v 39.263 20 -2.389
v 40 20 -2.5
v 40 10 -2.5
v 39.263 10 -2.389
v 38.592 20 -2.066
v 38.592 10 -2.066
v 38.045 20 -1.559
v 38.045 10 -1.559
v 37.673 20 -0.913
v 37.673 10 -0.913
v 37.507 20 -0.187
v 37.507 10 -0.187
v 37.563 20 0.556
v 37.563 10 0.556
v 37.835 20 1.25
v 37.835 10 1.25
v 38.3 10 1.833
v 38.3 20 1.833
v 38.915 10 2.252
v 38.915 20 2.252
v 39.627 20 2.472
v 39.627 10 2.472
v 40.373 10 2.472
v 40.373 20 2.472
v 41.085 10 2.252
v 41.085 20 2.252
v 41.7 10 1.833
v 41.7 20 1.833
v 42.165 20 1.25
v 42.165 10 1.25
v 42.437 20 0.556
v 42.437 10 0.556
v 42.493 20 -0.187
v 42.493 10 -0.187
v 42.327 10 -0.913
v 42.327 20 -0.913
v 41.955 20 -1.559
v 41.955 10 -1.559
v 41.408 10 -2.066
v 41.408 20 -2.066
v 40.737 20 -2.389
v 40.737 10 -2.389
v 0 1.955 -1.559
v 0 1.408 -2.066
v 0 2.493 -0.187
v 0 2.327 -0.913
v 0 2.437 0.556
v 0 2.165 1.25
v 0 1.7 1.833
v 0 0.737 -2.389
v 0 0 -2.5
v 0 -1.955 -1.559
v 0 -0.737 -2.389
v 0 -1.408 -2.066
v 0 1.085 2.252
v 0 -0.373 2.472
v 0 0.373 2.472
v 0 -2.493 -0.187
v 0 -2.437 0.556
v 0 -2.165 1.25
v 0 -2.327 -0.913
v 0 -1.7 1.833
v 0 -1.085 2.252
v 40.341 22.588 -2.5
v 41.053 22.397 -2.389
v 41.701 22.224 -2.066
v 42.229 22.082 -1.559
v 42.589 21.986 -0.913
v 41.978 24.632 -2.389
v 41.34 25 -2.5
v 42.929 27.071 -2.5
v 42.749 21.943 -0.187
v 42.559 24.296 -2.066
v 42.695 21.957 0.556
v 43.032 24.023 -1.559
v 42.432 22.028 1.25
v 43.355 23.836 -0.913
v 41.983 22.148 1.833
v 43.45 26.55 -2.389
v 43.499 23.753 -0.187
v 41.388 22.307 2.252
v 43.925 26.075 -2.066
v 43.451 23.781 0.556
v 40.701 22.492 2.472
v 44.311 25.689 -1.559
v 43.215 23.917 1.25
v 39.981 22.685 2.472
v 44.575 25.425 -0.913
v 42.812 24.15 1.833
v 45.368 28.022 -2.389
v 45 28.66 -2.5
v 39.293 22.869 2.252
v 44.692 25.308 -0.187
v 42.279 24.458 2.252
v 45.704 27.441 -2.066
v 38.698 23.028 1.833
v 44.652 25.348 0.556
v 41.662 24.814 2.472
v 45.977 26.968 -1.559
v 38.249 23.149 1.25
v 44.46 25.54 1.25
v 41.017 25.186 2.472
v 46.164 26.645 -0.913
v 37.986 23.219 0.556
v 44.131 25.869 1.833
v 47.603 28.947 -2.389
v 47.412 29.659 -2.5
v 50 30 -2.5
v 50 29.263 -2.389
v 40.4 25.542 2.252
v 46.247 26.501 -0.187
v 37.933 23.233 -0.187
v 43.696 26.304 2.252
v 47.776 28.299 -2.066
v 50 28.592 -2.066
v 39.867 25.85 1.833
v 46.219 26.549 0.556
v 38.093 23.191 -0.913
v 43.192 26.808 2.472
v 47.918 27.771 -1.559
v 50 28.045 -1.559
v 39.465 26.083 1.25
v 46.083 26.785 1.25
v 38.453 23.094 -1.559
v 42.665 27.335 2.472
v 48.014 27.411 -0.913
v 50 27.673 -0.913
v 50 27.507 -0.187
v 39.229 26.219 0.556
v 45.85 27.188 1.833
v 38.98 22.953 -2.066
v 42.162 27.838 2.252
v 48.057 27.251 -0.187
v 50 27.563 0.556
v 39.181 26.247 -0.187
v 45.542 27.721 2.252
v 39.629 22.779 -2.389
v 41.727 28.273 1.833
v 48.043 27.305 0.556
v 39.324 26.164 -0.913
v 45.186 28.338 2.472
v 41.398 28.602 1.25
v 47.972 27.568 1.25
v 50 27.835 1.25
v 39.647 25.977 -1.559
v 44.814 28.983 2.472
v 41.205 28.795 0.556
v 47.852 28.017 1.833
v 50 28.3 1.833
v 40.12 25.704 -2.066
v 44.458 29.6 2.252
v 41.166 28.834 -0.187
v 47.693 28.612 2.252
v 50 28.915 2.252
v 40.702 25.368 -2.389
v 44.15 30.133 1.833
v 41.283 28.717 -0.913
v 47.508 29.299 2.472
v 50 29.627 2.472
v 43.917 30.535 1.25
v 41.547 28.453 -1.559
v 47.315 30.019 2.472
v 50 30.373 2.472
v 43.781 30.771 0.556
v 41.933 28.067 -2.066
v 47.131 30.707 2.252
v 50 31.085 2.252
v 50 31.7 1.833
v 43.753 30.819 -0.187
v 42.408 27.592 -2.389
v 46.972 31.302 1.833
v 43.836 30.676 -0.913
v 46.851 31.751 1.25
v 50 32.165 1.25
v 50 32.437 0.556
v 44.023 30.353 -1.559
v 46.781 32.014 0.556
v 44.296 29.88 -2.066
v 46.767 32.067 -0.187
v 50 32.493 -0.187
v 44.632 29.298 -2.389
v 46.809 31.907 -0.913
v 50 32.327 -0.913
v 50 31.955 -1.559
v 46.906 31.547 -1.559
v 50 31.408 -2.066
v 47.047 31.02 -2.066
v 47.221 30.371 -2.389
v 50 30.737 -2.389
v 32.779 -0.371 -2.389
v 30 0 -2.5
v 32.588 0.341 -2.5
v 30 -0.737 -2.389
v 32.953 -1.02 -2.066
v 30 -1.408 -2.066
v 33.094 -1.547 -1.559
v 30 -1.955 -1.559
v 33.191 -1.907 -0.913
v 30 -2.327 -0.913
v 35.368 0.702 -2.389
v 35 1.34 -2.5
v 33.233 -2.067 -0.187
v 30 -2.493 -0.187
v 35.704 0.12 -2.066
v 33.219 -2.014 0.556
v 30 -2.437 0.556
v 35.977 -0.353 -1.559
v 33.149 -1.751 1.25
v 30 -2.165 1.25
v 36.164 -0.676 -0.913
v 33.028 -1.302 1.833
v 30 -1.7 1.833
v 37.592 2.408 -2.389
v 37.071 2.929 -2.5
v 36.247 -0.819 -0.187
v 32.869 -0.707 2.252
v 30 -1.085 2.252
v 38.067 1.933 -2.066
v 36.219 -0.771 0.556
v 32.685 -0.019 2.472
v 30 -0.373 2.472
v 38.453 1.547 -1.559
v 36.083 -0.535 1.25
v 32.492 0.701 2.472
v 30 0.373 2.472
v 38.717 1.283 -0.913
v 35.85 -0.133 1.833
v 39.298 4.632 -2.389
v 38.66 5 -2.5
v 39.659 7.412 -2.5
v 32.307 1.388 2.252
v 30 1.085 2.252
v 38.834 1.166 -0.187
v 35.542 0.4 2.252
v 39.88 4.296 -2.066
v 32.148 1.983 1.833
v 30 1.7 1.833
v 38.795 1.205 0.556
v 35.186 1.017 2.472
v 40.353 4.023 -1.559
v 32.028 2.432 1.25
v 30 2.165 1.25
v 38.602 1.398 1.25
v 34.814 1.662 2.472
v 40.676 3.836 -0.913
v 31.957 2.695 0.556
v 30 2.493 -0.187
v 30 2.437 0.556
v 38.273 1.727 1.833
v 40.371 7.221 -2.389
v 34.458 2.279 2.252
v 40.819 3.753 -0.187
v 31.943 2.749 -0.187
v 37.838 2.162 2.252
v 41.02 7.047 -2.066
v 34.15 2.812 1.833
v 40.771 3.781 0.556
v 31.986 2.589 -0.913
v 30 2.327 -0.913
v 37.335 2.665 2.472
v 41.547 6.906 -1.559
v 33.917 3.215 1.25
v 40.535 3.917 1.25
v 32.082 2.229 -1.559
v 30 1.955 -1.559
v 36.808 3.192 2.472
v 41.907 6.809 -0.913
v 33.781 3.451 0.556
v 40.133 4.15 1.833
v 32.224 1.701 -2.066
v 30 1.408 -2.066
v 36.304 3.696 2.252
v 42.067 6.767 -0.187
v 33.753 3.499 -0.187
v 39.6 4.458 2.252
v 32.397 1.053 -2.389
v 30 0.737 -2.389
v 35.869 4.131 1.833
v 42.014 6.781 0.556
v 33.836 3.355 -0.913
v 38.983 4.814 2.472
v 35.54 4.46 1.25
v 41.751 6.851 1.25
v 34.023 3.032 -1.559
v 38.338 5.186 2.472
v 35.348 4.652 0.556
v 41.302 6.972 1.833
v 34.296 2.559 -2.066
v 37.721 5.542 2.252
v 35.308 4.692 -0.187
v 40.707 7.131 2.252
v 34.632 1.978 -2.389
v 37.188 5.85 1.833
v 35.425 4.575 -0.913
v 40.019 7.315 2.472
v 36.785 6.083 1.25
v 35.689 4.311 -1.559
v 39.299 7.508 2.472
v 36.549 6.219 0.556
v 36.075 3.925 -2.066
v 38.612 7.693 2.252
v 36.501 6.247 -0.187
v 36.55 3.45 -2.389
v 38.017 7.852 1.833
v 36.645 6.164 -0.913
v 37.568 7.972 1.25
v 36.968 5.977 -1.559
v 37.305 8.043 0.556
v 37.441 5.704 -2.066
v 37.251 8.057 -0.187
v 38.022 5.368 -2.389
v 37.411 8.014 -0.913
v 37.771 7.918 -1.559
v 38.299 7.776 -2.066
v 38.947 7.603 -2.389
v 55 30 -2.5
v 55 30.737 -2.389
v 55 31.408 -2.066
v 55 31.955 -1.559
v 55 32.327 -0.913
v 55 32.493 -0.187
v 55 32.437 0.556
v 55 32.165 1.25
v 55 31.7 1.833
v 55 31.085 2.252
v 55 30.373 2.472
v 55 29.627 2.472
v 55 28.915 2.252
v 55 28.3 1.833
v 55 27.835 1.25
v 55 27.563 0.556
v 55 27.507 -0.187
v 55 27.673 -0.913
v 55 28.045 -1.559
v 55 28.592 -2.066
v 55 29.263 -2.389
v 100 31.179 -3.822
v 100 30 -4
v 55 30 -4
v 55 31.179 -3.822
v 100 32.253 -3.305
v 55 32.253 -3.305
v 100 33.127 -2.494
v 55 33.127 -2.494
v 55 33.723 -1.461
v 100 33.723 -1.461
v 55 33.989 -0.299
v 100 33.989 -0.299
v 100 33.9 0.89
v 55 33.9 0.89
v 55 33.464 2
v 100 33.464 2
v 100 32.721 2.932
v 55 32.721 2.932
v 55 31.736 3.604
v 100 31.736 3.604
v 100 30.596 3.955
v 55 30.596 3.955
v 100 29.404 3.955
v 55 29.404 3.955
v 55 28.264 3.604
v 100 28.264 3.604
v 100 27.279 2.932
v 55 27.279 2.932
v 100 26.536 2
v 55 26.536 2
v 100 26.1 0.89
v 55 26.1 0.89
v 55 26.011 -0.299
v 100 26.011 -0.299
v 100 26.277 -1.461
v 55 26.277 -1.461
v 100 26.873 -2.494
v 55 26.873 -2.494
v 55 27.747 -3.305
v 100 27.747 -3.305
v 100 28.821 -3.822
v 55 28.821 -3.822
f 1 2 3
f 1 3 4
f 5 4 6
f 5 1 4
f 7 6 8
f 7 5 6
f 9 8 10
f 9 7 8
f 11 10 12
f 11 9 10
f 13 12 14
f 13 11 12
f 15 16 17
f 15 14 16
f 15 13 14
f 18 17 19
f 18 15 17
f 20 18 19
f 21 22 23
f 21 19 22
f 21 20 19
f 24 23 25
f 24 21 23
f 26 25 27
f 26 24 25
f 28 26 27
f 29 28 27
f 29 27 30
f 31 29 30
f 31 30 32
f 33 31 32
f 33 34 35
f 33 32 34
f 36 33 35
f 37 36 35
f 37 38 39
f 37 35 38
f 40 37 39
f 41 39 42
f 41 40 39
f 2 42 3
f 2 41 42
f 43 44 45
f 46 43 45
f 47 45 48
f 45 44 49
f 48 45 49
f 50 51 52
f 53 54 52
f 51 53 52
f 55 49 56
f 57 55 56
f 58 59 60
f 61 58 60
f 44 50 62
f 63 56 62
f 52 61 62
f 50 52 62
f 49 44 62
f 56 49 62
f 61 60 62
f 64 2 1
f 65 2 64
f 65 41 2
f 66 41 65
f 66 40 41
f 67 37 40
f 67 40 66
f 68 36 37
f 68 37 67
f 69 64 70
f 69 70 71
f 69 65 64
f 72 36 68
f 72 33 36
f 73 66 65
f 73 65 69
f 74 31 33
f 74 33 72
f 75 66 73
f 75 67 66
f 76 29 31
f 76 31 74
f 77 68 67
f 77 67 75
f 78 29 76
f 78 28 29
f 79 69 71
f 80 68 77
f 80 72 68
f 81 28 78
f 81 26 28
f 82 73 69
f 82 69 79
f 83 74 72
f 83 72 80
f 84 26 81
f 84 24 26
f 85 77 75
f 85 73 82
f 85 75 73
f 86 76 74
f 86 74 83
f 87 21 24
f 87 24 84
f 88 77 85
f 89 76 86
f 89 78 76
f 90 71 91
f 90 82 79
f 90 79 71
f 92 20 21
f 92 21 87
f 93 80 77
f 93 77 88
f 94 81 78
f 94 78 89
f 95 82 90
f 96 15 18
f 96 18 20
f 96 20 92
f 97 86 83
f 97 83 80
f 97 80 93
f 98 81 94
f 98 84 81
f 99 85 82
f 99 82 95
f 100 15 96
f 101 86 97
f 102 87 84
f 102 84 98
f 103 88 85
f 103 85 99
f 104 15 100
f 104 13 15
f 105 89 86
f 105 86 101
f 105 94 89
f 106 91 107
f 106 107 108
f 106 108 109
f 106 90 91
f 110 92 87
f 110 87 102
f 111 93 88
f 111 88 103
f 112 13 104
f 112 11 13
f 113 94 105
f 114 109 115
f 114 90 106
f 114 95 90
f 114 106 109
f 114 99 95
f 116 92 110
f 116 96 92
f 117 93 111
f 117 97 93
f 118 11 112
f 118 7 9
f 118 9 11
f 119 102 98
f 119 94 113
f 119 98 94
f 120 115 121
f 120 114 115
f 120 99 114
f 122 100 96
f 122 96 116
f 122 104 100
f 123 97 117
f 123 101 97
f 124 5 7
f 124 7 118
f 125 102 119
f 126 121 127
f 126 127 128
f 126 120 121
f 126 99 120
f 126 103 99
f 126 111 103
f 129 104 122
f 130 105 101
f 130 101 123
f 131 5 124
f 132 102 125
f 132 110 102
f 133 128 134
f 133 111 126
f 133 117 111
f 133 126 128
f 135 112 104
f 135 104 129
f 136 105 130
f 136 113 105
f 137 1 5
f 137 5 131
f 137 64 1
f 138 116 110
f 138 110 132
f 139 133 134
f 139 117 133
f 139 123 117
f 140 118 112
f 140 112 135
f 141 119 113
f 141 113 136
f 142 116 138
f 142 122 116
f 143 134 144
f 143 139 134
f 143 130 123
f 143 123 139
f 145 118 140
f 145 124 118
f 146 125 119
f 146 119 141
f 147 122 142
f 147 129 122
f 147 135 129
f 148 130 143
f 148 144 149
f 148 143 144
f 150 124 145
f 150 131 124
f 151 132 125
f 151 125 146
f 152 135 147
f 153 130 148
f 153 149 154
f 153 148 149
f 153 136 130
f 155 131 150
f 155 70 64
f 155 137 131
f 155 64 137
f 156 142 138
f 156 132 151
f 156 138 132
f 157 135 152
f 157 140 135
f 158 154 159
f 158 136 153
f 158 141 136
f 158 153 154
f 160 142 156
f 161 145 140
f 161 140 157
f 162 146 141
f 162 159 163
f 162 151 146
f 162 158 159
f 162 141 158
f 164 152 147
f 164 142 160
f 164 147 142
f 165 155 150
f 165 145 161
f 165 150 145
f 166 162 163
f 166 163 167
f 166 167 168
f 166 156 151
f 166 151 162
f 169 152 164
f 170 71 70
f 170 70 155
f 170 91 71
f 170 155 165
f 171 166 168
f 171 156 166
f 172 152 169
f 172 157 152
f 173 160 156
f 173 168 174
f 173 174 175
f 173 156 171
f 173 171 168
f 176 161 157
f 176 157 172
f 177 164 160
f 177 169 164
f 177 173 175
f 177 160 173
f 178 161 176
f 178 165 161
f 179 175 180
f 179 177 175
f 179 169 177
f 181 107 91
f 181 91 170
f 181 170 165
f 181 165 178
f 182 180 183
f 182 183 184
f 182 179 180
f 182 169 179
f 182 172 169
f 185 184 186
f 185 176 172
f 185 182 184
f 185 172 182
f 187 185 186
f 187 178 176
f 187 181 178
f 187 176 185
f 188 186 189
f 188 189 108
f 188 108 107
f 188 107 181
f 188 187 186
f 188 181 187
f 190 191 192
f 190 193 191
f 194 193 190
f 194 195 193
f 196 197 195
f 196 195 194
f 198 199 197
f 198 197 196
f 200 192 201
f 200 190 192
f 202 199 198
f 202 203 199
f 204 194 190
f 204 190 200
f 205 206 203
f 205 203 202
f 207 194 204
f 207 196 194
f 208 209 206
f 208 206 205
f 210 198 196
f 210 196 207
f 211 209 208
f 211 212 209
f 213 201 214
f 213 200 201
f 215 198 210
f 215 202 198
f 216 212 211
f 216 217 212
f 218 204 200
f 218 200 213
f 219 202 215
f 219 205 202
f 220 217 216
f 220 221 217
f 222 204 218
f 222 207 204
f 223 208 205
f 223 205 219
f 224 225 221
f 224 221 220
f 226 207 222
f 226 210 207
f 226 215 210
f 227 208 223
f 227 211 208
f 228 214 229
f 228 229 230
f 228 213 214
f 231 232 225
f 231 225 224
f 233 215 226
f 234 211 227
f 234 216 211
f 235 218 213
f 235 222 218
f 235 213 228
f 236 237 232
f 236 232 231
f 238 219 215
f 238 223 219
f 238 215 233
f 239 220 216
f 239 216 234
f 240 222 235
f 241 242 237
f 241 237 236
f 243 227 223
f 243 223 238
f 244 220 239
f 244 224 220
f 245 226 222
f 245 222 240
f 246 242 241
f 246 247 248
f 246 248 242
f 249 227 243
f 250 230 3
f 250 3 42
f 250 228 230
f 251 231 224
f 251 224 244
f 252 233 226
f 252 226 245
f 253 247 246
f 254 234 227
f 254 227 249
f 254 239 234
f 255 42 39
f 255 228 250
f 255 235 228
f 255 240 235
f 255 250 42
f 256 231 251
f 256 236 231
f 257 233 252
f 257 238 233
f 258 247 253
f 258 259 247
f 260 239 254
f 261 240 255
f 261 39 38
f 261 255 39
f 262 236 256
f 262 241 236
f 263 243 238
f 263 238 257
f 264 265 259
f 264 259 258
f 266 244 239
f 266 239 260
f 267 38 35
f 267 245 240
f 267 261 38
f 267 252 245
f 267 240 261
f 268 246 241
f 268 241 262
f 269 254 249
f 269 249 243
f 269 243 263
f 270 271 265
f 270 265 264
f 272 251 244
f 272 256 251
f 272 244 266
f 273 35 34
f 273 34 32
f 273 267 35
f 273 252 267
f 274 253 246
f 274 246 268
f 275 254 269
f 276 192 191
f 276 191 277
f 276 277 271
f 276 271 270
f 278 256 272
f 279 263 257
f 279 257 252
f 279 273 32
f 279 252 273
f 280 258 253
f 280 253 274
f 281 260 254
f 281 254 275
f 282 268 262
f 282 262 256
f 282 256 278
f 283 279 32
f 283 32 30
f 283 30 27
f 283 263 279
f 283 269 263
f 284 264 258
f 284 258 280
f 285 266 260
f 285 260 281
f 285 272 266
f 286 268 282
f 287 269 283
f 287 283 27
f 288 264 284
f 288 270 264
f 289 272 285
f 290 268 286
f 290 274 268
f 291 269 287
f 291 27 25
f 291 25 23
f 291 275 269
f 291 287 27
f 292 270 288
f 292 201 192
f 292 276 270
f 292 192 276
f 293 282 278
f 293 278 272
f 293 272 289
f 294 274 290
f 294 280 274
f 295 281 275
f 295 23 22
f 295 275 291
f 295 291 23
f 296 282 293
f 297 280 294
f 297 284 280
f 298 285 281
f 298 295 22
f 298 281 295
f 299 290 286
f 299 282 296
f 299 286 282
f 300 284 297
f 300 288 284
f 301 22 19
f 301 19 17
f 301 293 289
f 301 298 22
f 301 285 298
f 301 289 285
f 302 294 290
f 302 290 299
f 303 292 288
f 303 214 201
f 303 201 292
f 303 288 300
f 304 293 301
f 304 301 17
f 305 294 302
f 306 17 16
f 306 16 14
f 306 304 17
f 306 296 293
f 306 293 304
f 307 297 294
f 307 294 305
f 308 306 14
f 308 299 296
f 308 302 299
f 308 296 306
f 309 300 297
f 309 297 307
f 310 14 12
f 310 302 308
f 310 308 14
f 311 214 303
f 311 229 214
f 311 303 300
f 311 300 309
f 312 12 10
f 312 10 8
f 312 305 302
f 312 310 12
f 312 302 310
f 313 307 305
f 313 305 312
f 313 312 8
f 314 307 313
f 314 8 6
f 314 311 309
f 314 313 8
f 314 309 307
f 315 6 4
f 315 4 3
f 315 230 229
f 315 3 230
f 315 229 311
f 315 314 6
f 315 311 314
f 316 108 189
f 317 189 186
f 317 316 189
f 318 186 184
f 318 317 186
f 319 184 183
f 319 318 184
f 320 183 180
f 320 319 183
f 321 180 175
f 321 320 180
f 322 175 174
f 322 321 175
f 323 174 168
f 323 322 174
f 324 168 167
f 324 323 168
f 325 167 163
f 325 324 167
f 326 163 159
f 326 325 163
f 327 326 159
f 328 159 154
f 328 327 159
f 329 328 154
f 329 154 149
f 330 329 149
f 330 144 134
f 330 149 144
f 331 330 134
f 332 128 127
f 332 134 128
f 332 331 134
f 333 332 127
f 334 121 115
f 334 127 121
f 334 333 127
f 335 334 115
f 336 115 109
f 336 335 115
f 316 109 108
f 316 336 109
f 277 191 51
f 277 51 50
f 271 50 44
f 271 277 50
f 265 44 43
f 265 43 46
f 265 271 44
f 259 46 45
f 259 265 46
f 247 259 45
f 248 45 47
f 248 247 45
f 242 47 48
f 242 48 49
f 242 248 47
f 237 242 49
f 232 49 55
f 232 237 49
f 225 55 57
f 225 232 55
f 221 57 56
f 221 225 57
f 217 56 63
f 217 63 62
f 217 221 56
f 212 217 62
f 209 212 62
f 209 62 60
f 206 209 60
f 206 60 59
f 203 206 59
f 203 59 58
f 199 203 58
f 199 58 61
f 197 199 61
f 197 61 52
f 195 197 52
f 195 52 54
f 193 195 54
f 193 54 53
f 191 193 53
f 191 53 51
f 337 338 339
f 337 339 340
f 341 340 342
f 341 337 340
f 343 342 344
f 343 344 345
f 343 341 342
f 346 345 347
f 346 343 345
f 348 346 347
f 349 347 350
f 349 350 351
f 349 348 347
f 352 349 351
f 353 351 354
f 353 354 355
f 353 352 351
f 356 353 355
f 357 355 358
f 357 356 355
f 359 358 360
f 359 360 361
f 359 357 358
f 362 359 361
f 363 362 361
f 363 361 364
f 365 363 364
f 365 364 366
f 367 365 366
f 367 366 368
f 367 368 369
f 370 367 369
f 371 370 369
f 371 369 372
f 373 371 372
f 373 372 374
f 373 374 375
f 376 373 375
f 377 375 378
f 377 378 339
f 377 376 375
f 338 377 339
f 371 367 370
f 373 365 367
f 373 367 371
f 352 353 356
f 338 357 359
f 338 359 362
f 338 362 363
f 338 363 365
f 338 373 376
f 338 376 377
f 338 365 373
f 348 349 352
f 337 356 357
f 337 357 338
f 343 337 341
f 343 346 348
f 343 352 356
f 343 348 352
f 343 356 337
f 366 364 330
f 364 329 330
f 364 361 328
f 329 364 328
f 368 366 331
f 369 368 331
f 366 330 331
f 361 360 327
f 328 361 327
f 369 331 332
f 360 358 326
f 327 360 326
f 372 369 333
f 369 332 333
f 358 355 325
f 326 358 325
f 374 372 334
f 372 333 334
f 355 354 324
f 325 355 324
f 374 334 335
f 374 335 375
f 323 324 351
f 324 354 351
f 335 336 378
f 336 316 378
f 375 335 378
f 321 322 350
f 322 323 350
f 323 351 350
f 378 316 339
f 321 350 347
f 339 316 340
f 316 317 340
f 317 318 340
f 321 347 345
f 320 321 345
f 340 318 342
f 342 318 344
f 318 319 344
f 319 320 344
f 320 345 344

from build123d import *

# Parameters (mm, degrees)
ESQUISSE2_R        = 2.5
ESQUISSE3_R        = 4
BOSS_EXTRU_1_DEPTH = 45


with BuildPart() as part:
    # Balayage1: sweep along a path in Esquisse1
    with BuildLine(Plane.XY) as balayage1_path:
        Line((0, 0), (30, 0))
        ThreePointArc((30, 0), (37.071067812, 2.928932188), (40, 10))
        Line((40, 10), (40, 20))
        ThreePointArc((40, 20), (42.928932188, 27.071067812), (50, 30))
        Line((50, 30), (100, 30))
    # Esquisse2 → Balayage1 (sweep)
    with BuildSketch(Plane(origin=(100, 0, 0), x_dir=(0, 0, -1), z_dir=(1, 0, 0))):
        with Locations((0, 30)):
            Circle(ESQUISSE2_R)
    sweep(path=balayage1_path.line)

    # Esquisse3 → Boss.-Extru.1 (add)
    with BuildSketch(Plane(origin=(100, 0, 0), x_dir=(0, 0, -1), z_dir=(1, 0, 0))):
        with Locations((0, 30)):
            Circle(ESQUISSE3_R)
    extrude(amount=-BOSS_EXTRU_1_DEPTH)


solid = part.part
